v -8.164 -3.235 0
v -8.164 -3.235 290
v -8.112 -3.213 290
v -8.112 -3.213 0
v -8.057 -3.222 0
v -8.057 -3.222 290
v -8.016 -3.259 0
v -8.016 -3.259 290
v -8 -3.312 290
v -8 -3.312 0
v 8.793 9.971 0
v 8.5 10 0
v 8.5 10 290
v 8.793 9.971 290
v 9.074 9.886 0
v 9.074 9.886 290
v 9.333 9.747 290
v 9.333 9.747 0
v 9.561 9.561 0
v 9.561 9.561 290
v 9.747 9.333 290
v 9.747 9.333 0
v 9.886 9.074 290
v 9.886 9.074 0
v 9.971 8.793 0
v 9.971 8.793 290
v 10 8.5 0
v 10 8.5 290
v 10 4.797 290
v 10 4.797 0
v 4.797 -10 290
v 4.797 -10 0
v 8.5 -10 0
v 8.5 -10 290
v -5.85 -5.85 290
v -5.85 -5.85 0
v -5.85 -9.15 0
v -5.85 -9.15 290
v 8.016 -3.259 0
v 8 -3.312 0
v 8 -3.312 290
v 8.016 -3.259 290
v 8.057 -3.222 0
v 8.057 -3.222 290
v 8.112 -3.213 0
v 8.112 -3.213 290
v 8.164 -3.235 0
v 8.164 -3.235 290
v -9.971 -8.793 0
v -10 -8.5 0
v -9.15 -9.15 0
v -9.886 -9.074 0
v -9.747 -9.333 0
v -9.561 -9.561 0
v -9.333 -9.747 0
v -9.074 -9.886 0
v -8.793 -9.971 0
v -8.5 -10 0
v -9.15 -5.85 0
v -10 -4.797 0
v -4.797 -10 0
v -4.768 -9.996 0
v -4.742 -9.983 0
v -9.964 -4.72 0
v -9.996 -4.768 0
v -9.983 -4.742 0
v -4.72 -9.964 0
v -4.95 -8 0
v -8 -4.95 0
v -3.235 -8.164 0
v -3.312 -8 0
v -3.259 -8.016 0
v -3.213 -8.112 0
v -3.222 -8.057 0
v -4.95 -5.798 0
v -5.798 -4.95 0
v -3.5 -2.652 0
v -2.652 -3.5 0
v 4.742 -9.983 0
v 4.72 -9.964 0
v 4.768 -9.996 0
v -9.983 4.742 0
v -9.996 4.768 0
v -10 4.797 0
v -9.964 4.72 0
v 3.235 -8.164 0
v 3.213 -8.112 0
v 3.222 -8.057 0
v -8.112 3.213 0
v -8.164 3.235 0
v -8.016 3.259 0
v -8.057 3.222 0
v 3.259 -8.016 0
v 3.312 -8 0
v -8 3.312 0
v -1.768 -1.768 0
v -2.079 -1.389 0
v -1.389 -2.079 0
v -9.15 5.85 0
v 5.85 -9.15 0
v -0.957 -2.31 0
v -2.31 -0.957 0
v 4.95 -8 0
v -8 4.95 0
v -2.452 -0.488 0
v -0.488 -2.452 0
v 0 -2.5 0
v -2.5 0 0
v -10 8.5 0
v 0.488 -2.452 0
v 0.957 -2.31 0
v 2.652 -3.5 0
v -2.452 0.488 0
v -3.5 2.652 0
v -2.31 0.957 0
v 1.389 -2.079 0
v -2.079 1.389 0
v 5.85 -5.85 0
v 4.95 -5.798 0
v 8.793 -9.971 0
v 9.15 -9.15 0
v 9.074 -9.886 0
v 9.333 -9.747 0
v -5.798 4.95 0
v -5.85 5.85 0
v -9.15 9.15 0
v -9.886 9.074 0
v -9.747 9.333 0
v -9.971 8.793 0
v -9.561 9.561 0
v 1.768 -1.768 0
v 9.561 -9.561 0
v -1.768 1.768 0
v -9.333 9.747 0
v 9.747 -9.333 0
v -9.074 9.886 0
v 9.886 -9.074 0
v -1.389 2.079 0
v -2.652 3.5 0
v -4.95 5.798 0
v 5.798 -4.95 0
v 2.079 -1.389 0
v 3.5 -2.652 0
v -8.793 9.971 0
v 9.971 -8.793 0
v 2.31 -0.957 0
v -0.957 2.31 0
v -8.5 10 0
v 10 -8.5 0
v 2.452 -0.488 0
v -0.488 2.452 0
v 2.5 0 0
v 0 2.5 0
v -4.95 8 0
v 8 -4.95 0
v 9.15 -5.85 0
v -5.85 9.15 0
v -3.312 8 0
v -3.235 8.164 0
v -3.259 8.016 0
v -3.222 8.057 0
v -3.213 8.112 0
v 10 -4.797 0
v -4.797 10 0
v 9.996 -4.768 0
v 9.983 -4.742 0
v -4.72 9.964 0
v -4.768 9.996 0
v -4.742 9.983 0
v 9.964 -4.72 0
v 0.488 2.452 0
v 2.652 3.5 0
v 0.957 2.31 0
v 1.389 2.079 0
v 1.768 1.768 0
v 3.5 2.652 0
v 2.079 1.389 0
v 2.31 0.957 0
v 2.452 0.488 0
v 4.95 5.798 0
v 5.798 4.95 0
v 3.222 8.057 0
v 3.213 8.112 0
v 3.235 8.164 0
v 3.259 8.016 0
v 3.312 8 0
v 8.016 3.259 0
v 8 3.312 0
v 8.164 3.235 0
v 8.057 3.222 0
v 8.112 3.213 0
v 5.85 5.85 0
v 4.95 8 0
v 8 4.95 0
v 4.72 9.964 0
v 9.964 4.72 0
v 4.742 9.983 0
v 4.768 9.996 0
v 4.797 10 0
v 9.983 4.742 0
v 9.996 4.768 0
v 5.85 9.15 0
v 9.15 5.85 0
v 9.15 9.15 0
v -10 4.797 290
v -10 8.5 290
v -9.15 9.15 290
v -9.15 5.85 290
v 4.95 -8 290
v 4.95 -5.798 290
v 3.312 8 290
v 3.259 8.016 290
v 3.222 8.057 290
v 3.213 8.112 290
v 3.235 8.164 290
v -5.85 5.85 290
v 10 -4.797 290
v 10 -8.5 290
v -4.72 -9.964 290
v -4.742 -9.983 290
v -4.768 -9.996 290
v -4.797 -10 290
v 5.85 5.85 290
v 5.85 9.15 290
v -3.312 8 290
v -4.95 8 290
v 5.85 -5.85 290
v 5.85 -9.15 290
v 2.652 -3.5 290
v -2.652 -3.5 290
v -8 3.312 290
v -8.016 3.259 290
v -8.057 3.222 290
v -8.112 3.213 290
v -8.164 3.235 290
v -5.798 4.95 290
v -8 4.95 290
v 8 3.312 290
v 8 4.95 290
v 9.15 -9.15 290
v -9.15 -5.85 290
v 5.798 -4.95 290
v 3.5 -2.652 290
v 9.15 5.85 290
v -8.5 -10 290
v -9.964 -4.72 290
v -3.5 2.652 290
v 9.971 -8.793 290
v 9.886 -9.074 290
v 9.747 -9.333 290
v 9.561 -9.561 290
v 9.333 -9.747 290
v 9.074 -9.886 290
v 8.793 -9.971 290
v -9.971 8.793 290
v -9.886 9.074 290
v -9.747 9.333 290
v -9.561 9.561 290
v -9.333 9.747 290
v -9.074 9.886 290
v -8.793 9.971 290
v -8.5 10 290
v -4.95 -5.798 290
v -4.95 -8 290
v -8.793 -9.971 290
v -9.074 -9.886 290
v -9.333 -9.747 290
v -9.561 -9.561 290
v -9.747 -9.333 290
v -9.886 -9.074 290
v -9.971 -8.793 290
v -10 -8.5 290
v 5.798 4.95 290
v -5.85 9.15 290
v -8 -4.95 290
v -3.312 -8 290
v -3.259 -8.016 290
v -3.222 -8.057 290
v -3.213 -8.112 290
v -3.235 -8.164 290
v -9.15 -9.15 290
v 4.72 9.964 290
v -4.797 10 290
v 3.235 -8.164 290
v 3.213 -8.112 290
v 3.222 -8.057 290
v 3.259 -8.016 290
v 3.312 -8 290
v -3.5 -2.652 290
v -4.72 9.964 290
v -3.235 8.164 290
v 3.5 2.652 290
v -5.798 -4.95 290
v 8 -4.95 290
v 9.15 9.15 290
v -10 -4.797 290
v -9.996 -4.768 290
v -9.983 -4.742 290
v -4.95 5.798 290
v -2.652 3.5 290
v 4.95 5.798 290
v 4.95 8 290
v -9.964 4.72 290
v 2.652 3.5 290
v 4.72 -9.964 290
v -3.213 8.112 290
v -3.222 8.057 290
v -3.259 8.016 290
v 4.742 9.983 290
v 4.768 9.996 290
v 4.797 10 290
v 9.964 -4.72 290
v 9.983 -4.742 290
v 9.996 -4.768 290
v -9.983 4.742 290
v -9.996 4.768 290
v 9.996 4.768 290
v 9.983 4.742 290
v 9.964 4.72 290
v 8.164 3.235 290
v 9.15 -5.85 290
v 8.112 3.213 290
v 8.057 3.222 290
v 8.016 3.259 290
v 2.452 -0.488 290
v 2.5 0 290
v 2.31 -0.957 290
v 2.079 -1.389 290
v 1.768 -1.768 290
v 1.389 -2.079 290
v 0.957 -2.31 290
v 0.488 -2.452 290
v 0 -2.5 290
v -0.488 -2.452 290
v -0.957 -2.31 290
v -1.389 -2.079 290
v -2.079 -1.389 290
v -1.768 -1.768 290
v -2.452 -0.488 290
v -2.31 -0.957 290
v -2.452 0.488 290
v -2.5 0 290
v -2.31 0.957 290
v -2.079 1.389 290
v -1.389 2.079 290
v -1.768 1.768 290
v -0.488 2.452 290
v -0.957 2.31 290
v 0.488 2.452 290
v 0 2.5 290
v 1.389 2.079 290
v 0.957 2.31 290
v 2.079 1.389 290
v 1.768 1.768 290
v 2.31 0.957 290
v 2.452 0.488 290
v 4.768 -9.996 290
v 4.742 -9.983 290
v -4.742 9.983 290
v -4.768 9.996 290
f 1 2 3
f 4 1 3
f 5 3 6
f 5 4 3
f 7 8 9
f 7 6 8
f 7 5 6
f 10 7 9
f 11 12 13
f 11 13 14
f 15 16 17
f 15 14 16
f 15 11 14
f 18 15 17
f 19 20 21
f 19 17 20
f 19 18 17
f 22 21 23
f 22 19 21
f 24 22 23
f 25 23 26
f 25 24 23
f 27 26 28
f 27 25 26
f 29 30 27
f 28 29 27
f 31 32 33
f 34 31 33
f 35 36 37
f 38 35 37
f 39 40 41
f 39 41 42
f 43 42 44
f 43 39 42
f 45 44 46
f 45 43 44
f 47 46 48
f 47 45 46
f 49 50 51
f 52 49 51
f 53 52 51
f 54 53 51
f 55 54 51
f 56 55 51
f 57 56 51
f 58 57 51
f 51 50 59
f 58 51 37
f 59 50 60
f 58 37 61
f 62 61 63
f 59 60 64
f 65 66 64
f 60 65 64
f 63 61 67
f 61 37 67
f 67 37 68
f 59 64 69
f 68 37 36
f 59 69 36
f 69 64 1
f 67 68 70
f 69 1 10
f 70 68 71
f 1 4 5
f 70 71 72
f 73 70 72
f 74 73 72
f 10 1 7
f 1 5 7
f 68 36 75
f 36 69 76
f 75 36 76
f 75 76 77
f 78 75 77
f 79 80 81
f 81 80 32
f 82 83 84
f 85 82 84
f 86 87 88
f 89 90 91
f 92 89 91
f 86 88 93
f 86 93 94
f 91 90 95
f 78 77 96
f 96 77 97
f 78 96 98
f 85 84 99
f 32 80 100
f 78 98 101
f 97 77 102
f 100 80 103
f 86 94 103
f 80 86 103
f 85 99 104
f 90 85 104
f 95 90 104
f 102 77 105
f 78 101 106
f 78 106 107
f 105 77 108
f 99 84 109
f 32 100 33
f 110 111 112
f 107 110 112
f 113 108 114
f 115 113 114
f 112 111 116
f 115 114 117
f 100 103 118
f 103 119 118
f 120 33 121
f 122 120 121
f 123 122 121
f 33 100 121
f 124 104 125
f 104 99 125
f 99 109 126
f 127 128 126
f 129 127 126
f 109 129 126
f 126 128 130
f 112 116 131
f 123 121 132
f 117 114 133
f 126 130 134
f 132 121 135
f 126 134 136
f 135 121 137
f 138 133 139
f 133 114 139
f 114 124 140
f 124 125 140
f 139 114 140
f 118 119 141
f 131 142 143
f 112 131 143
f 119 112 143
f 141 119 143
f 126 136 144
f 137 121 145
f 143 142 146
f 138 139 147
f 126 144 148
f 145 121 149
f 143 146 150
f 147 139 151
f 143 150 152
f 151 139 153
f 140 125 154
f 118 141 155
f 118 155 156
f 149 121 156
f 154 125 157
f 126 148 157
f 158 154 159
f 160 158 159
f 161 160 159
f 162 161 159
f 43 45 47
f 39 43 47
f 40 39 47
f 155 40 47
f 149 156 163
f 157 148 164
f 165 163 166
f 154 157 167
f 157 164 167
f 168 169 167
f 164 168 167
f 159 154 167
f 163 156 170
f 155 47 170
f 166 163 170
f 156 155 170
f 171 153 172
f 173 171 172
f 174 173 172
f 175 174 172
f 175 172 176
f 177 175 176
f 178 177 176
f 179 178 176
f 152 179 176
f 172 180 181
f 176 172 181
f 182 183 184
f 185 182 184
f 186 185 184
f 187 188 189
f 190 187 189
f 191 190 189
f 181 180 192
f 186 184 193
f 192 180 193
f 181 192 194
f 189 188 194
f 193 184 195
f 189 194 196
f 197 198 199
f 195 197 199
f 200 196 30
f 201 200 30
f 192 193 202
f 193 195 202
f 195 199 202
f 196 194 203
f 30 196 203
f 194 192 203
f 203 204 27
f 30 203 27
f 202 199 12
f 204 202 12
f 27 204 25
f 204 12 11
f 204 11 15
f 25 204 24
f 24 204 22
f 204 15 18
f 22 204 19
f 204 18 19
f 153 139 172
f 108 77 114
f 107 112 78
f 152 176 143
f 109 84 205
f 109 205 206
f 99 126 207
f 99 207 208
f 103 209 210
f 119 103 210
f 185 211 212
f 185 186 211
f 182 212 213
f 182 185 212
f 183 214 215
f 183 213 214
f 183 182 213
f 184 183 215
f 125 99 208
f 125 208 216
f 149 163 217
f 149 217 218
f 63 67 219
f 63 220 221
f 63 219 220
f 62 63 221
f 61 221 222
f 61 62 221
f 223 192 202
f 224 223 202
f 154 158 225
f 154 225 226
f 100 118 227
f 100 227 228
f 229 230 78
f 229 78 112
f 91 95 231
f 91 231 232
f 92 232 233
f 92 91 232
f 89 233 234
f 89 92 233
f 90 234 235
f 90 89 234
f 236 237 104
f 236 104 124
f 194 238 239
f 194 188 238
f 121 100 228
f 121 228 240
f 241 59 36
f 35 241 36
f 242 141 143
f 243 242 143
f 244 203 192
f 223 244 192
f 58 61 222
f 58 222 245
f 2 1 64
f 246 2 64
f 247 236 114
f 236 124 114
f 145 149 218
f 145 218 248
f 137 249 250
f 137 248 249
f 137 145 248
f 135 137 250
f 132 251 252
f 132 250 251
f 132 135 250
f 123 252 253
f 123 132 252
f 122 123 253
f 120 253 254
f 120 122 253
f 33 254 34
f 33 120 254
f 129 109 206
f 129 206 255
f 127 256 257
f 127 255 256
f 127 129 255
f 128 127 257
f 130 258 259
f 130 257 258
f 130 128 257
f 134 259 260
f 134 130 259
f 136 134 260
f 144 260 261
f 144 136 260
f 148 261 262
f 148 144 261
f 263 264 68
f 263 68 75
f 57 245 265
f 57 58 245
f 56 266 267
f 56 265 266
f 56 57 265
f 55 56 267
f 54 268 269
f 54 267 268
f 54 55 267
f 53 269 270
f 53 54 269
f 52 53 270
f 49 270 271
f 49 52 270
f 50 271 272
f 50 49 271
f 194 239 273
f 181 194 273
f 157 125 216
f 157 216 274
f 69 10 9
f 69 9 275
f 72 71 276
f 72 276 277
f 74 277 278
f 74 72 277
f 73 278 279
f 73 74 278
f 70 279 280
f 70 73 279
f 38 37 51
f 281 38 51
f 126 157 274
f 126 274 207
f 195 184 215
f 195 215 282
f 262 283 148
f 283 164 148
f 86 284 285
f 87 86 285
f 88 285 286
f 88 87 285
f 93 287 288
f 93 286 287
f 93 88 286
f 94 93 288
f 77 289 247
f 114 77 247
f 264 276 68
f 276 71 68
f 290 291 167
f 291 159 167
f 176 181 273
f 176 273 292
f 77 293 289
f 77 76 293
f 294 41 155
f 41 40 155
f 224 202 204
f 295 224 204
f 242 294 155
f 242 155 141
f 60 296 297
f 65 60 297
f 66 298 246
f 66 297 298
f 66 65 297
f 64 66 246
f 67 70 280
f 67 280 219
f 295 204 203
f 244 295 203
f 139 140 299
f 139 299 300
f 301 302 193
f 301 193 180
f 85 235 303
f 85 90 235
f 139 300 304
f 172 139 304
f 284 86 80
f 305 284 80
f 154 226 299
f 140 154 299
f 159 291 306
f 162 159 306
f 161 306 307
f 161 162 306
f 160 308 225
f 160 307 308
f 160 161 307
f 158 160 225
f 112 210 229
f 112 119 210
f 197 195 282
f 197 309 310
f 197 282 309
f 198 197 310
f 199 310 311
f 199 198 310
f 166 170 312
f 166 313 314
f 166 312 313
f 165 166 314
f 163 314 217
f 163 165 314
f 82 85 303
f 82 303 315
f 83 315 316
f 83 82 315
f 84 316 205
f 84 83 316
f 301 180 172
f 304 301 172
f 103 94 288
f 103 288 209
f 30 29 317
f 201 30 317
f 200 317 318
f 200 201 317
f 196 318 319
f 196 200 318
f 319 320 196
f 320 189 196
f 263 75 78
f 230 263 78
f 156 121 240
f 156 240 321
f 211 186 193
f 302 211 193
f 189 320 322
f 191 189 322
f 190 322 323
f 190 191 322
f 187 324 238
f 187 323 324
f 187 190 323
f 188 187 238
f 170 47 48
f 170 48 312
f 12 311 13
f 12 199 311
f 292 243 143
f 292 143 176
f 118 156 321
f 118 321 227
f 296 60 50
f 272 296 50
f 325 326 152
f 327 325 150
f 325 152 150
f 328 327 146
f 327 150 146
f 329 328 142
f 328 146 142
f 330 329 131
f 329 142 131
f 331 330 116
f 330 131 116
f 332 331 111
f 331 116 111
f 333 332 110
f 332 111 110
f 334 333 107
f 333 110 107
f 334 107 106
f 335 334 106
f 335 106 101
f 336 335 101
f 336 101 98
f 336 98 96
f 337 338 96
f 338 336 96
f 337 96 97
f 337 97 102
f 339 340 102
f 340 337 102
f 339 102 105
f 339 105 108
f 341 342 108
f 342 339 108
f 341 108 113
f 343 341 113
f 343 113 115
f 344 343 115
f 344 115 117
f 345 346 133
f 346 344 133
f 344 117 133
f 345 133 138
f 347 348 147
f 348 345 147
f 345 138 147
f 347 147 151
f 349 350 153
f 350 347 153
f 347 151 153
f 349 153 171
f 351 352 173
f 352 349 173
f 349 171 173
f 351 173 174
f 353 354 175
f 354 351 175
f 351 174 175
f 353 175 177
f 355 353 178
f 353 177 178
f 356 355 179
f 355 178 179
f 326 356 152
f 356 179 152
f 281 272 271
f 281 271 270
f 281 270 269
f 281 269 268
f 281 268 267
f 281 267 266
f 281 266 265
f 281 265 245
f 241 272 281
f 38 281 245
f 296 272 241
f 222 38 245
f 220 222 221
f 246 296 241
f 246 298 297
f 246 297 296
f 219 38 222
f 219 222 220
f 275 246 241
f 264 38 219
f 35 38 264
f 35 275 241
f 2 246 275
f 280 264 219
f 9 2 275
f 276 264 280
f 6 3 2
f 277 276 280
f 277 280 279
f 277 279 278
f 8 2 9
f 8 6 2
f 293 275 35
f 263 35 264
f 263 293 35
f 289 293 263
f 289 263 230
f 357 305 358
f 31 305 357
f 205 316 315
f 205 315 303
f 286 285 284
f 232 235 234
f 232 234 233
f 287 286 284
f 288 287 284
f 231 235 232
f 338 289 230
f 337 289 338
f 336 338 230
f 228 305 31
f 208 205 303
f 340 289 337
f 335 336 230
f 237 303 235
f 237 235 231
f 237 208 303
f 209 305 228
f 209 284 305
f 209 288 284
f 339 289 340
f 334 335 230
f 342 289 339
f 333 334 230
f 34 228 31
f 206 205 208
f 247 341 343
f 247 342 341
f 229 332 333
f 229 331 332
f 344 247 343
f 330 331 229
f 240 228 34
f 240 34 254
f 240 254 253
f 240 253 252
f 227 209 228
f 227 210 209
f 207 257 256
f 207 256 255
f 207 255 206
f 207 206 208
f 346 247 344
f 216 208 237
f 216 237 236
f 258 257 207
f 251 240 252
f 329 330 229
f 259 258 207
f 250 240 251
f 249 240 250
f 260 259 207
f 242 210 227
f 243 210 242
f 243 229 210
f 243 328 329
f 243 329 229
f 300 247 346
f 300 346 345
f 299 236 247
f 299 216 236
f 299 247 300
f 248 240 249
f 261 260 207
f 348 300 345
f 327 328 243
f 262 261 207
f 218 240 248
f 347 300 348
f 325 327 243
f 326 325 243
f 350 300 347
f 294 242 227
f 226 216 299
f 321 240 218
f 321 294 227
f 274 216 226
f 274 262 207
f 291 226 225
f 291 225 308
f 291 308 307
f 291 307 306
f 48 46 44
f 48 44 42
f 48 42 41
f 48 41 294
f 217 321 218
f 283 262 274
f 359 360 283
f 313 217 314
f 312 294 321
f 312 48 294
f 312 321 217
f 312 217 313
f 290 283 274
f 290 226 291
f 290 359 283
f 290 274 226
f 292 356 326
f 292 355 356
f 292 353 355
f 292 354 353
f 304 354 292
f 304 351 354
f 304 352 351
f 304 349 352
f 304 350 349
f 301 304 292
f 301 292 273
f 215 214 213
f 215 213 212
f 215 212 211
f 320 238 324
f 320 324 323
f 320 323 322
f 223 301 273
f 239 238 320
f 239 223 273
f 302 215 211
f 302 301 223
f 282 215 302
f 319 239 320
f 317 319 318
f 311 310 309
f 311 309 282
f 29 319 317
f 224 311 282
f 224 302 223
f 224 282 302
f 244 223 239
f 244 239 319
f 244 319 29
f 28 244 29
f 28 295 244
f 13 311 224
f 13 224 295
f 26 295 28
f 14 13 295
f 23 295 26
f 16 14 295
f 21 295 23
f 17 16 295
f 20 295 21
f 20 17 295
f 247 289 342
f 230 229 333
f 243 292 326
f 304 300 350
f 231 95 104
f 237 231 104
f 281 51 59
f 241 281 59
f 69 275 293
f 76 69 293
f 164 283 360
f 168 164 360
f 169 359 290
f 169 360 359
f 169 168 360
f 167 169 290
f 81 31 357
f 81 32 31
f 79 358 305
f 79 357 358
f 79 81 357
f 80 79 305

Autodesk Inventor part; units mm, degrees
ref_plane "YZ Plane" through (0, 0, 0) normal (1, 0, 0) x (0, 1, 0)
ref_plane "Начальная плоскость" through (0, 0, 0) normal (0, 0, 1) x (1, 0, 0)
ref_plane "Конечная плоскость" through (0, 0, 290) normal (0, 0, 1) x (1, 0, 0)
sketch "Эскиз" plane through (0, 0, 0) normal (0, 0, 1) x (1, 0, 0)
  line L0 (-14.4349, 0) -> (14.4349, 0) projected
  line L1 (0, -14) -> (0, 14) projected
  line L2 (0, 0) -> (7.5, 7.5) construction
  circle A0 centre (7.5, 7.5) radius 1.65 construction
  line L3 (5.85, 9.15) -> (9.15, 9.15)
  line L4 (9.15, 9.15) -> (9.15, 5.85)
  line L5 (9.15, 5.85) -> (5.85, 5.85)
  line L6 (5.85, 5.85) -> (5.85, 9.15)
  line L7 (3.235, 8.1636) -> (4.72, 9.9636)
  line L8 (4.7971, 10) -> (8.5, 10)
  line L9 (3.3121, 8) -> (4.95, 8)
  line L10 (4.95, 8) -> (4.95, 5.7985)
  line L11 (4.95, 5.7985) -> (2.6515, 3.5)
  line L12 (0, 3.5) -> (2.6515, 3.5)
  circle A1 centre (0, 0) radius 2.5
  line L13 (8.1636, 3.235) -> (9.9636, 4.72)
  line L14 (10, 4.7971) -> (10, 8.5)
  line L15 (8, 3.3121) -> (8, 4.95)
  line L16 (8, 4.95) -> (5.7985, 4.95)
  line L17 (5.7985, 4.95) -> (3.5, 2.6515)
  line L18 (3.5, 0) -> (3.5, 2.6515)
  arc A2 (10, 8.5) -> (8.5, 10) centre (8.5, 8.5) ccw
  line L19 (0, 0) -> (-7.5, 7.5) construction
  circle A3 centre (-7.5, 7.5) radius 1.65 construction
  line L20 (-5.85, 9.15) -> (-9.15, 9.15)
  line L21 (-9.15, 9.15) -> (-9.15, 5.85)
  line L22 (-9.15, 5.85) -> (-5.85, 5.85)
  line L23 (-5.85, 5.85) -> (-5.85, 9.15)
  line L24 (-3.235, 8.1636) -> (-4.72, 9.9636)
  line L25 (-4.7971, 10) -> (-8.5, 10)
  line L26 (-3.3121, 8) -> (-4.95, 8)
  line L27 (-4.95, 8) -> (-4.95, 5.7985)
  line L28 (-4.95, 5.7985) -> (-2.6515, 3.5)
  line L29 (0, 3.5) -> (-2.6515, 3.5)
  line L30 (-3.5, 0) -> (-3.5, 2.6515)
  line L31 (-5.7985, 4.95) -> (-3.5, 2.6515)
  line L32 (-8, 4.95) -> (-5.7985, 4.95)
  line L33 (-8, 3.3121) -> (-8, 4.95)
  line L34 (-8.1636, 3.235) -> (-9.9636, 4.72)
  line L35 (-10, 4.7971) -> (-10, 8.5)
  arc A4 (-8.5, 10) -> (-10, 8.5) centre (-8.5, 8.5) ccw
  line L36 (0, 14) -> (0, -14)
  line L37 (0, 0) -> (7.5, -7.5) construction
  circle A5 centre (7.5, -7.5) radius 1.65 construction
  line L38 (5.85, -9.15) -> (9.15, -9.15)
  line L39 (9.15, -9.15) -> (9.15, -5.85)
  line L40 (9.15, -5.85) -> (5.85, -5.85)
  line L41 (5.85, -5.85) -> (5.85, -9.15)
  line L42 (3.235, -8.1636) -> (4.72, -9.9636)
  line L43 (4.7971, -10) -> (8.5, -10)
  line L44 (3.3121, -8) -> (4.95, -8)
  line L45 (4.95, -8) -> (4.95, -5.7985)
  line L46 (4.95, -5.7985) -> (2.6515, -3.5)
  line L47 (0, -3.5) -> (2.6515, -3.5)
  line L48 (3.5, 0) -> (3.5, -2.6515)
  line L49 (5.7985, -4.95) -> (3.5, -2.6515)
  line L50 (8, -4.95) -> (5.7985, -4.95)
  line L51 (8, -3.3121) -> (8, -4.95)
  line L52 (8.1636, -3.235) -> (9.9636, -4.72)
  line L53 (10, -4.7971) -> (10, -8.5)
  arc A6 (8.5, -10) -> (10, -8.5) centre (8.5, -8.5) ccw
  line L54 (0, 0) -> (-7.5, -7.5) construction
  line L55 (-4.95, -8) -> (-4.95, -5.7985)
  line L56 (-3.3121, -8) -> (-4.95, -8)
  line L57 (-5.7985, -4.95) -> (-3.5, -2.6515)
  line L58 (-4.95, -5.7985) -> (-2.6515, -3.5)
  line L59 (-3.5, 0) -> (-3.5, -2.6515)
  line L60 (0, -3.5) -> (-2.6515, -3.5)
  circle A7 centre (-7.5, -7.5) radius 1.65 construction
  line L61 (-5.85, -5.85) -> (-5.85, -9.15)
  line L62 (-5.85, -9.15) -> (-9.15, -9.15)
  line L63 (-9.15, -9.15) -> (-9.15, -5.85)
  line L64 (-9.15, -5.85) -> (-5.85, -5.85)
  line L65 (-3.235, -8.1636) -> (-4.72, -9.9636)
  line L66 (-8, -4.95) -> (-5.7985, -4.95)
  line L67 (-8, -3.3121) -> (-8, -4.95)
  line L68 (-8.1636, -3.235) -> (-9.9636, -4.72)
  line L69 (-4.7971, -10) -> (-8.5, -10)
  line L70 (-10, -4.7971) -> (-10, -8.5)
  arc A8 (-10, -8.5) -> (-8.5, -10) centre (-8.5, -8.5) ccw
  arc A9 (3.235, 8.1636) -> (3.3121, 8) centre (3.3121, 8.1) ccw
  arc A10 (4.7971, 10) -> (4.72, 9.9636) centre (4.7971, 9.9) ccw
  arc A11 (8, 3.3121) -> (8.1636, 3.235) centre (8.1, 3.3121) ccw
  arc A12 (9.9636, 4.72) -> (10, 4.7971) centre (9.9, 4.7971) ccw
  arc A13 (-3.3121, 8) -> (-3.235, 8.1636) centre (-3.3121, 8.1) ccw
  arc A14 (-4.72, 9.9636) -> (-4.7971, 10) centre (-4.7971, 9.9) ccw
  arc A15 (-8.1636, 3.235) -> (-8, 3.3121) centre (-8.1, 3.3121) ccw
  arc A16 (-10, 4.7971) -> (-9.9636, 4.72) centre (-9.9, 4.7971) ccw
  arc A17 (-8, -3.3121) -> (-8.1636, -3.235) centre (-8.1, -3.3121) ccw
  arc A18 (-9.9636, -4.72) -> (-10, -4.7971) centre (-9.9, -4.7971) ccw
  arc A19 (-3.235, -8.1636) -> (-3.3121, -8) centre (-3.3121, -8.1) ccw
  arc A20 (-4.7971, -10) -> (-4.72, -9.9636) centre (-4.7971, -9.9) ccw
  arc A21 (4.72, -9.9636) -> (4.7971, -10) centre (4.7971, -9.9) ccw
  arc A22 (3.3121, -8) -> (3.235, -8.1636) centre (3.3121, -8.1) ccw
  arc A23 (8.1636, -3.235) -> (8, -3.3121) centre (8.1, -3.3121) ccw
  arc A24 (10, -4.7971) -> (9.9636, -4.72) centre (9.9, -4.7971) ccw
  point P0 (3.1, 8)
  point P1 (4.75, 10)
  point P2 (7.5, 9.15)
  point P3 (8, 3.1)
  point P4 (10, 4.75)
  point P5 (7.5, 5.85)
  point P6 (9.15, 7.5)
  point P7 (-3.1, 8)
  point P8 (-4.75, 10)
  point P9 (-7.5, 9.15)
  point P10 (-8, 3.1)
  point P11 (-10, 4.75)
  point P12 (-7.5, 5.85)
  point P13 (-9.15, 7.5)
  point P14 (3.1, -8)
  point P15 (4.75, -10)
  point P16 (7.5, -9.15)
  point P17 (8, -3.1)
  point P18 (10, -4.75)
  point P19 (7.5, -5.85)
  point P20 (9.15, -7.5)
  point P21 (-3.1, -8)
  point P22 (-7.5, -5.85)
  point P23 (-7.5, -9.15)
  point P24 (-9.15, -7.5)
  point P25 (-4.75, -10)
  point P26 (-8, -3.1)
  point P27 (-10, -4.75)
  dimension "d0" = 45
  dimension "d1" = 3.3
  dimension "d2" = 1.5
  dimension "d3" = 1.2
  dimension "d4" = 5
  dimension "d5" = 6.5
  dimension "d6" = 15
  dimension "d7" = 20
  dimension "d8" = 9.9
  dimension "d9" = 9.5
  dimension "d10" = 6.2
  dimension "d11" = 2
  dimension "d18" = 0.1
  dimension "d19" = 0.1
extrude "Тело" add sketch "Эскиз" along normal up to surface (290 mm away) from surface at 0 contours A1 L1 L12 L11 L10 L9 A9 L7 A10 L8 A2 L14 A12 L13 A11 L15 L16 L17 L18 L0 | L0 L48 L49 L50 L51 A23 L52 A24 L53 A6 L43 A21 L42 A22 L44 L45 L46 L47 L1 A1 | A1 L0 L30 L31 L32 L33 A15 L34 A16 L35 A4 L25 A14 L24 A13 L26 L27 L28 L29 L1 | L1 L60 L58 L55 L56 A19 L65 A20 L69 A8 L70 A18 L68 A17 L67 L66 L57 L59 L0 A1
sketch "Эскиз2" plane through (0, 0, 0) normal (0, 0, 1) x (1, 0, 0)
  line L0 (0, 0) -> (10, 0)
ref_plane "РабПлоскость3" through (0, 0, 0) normal (0, -1, 0) x (1, 0, 0)
sketch "Эскиз3" plane through (0, 0, 0) normal (0, -1, 0) x (1, 0, 0)
  line L0 (-2, 0) -> (12, 0)
  line L1 (-2, 290) -> (12, 290)
  dimension "d25" = 290
equation "\"G_OFFSET_START\" = 0"
equation "\"G_OFFSET_END\" = 0"
properties part number "короткая палка"
